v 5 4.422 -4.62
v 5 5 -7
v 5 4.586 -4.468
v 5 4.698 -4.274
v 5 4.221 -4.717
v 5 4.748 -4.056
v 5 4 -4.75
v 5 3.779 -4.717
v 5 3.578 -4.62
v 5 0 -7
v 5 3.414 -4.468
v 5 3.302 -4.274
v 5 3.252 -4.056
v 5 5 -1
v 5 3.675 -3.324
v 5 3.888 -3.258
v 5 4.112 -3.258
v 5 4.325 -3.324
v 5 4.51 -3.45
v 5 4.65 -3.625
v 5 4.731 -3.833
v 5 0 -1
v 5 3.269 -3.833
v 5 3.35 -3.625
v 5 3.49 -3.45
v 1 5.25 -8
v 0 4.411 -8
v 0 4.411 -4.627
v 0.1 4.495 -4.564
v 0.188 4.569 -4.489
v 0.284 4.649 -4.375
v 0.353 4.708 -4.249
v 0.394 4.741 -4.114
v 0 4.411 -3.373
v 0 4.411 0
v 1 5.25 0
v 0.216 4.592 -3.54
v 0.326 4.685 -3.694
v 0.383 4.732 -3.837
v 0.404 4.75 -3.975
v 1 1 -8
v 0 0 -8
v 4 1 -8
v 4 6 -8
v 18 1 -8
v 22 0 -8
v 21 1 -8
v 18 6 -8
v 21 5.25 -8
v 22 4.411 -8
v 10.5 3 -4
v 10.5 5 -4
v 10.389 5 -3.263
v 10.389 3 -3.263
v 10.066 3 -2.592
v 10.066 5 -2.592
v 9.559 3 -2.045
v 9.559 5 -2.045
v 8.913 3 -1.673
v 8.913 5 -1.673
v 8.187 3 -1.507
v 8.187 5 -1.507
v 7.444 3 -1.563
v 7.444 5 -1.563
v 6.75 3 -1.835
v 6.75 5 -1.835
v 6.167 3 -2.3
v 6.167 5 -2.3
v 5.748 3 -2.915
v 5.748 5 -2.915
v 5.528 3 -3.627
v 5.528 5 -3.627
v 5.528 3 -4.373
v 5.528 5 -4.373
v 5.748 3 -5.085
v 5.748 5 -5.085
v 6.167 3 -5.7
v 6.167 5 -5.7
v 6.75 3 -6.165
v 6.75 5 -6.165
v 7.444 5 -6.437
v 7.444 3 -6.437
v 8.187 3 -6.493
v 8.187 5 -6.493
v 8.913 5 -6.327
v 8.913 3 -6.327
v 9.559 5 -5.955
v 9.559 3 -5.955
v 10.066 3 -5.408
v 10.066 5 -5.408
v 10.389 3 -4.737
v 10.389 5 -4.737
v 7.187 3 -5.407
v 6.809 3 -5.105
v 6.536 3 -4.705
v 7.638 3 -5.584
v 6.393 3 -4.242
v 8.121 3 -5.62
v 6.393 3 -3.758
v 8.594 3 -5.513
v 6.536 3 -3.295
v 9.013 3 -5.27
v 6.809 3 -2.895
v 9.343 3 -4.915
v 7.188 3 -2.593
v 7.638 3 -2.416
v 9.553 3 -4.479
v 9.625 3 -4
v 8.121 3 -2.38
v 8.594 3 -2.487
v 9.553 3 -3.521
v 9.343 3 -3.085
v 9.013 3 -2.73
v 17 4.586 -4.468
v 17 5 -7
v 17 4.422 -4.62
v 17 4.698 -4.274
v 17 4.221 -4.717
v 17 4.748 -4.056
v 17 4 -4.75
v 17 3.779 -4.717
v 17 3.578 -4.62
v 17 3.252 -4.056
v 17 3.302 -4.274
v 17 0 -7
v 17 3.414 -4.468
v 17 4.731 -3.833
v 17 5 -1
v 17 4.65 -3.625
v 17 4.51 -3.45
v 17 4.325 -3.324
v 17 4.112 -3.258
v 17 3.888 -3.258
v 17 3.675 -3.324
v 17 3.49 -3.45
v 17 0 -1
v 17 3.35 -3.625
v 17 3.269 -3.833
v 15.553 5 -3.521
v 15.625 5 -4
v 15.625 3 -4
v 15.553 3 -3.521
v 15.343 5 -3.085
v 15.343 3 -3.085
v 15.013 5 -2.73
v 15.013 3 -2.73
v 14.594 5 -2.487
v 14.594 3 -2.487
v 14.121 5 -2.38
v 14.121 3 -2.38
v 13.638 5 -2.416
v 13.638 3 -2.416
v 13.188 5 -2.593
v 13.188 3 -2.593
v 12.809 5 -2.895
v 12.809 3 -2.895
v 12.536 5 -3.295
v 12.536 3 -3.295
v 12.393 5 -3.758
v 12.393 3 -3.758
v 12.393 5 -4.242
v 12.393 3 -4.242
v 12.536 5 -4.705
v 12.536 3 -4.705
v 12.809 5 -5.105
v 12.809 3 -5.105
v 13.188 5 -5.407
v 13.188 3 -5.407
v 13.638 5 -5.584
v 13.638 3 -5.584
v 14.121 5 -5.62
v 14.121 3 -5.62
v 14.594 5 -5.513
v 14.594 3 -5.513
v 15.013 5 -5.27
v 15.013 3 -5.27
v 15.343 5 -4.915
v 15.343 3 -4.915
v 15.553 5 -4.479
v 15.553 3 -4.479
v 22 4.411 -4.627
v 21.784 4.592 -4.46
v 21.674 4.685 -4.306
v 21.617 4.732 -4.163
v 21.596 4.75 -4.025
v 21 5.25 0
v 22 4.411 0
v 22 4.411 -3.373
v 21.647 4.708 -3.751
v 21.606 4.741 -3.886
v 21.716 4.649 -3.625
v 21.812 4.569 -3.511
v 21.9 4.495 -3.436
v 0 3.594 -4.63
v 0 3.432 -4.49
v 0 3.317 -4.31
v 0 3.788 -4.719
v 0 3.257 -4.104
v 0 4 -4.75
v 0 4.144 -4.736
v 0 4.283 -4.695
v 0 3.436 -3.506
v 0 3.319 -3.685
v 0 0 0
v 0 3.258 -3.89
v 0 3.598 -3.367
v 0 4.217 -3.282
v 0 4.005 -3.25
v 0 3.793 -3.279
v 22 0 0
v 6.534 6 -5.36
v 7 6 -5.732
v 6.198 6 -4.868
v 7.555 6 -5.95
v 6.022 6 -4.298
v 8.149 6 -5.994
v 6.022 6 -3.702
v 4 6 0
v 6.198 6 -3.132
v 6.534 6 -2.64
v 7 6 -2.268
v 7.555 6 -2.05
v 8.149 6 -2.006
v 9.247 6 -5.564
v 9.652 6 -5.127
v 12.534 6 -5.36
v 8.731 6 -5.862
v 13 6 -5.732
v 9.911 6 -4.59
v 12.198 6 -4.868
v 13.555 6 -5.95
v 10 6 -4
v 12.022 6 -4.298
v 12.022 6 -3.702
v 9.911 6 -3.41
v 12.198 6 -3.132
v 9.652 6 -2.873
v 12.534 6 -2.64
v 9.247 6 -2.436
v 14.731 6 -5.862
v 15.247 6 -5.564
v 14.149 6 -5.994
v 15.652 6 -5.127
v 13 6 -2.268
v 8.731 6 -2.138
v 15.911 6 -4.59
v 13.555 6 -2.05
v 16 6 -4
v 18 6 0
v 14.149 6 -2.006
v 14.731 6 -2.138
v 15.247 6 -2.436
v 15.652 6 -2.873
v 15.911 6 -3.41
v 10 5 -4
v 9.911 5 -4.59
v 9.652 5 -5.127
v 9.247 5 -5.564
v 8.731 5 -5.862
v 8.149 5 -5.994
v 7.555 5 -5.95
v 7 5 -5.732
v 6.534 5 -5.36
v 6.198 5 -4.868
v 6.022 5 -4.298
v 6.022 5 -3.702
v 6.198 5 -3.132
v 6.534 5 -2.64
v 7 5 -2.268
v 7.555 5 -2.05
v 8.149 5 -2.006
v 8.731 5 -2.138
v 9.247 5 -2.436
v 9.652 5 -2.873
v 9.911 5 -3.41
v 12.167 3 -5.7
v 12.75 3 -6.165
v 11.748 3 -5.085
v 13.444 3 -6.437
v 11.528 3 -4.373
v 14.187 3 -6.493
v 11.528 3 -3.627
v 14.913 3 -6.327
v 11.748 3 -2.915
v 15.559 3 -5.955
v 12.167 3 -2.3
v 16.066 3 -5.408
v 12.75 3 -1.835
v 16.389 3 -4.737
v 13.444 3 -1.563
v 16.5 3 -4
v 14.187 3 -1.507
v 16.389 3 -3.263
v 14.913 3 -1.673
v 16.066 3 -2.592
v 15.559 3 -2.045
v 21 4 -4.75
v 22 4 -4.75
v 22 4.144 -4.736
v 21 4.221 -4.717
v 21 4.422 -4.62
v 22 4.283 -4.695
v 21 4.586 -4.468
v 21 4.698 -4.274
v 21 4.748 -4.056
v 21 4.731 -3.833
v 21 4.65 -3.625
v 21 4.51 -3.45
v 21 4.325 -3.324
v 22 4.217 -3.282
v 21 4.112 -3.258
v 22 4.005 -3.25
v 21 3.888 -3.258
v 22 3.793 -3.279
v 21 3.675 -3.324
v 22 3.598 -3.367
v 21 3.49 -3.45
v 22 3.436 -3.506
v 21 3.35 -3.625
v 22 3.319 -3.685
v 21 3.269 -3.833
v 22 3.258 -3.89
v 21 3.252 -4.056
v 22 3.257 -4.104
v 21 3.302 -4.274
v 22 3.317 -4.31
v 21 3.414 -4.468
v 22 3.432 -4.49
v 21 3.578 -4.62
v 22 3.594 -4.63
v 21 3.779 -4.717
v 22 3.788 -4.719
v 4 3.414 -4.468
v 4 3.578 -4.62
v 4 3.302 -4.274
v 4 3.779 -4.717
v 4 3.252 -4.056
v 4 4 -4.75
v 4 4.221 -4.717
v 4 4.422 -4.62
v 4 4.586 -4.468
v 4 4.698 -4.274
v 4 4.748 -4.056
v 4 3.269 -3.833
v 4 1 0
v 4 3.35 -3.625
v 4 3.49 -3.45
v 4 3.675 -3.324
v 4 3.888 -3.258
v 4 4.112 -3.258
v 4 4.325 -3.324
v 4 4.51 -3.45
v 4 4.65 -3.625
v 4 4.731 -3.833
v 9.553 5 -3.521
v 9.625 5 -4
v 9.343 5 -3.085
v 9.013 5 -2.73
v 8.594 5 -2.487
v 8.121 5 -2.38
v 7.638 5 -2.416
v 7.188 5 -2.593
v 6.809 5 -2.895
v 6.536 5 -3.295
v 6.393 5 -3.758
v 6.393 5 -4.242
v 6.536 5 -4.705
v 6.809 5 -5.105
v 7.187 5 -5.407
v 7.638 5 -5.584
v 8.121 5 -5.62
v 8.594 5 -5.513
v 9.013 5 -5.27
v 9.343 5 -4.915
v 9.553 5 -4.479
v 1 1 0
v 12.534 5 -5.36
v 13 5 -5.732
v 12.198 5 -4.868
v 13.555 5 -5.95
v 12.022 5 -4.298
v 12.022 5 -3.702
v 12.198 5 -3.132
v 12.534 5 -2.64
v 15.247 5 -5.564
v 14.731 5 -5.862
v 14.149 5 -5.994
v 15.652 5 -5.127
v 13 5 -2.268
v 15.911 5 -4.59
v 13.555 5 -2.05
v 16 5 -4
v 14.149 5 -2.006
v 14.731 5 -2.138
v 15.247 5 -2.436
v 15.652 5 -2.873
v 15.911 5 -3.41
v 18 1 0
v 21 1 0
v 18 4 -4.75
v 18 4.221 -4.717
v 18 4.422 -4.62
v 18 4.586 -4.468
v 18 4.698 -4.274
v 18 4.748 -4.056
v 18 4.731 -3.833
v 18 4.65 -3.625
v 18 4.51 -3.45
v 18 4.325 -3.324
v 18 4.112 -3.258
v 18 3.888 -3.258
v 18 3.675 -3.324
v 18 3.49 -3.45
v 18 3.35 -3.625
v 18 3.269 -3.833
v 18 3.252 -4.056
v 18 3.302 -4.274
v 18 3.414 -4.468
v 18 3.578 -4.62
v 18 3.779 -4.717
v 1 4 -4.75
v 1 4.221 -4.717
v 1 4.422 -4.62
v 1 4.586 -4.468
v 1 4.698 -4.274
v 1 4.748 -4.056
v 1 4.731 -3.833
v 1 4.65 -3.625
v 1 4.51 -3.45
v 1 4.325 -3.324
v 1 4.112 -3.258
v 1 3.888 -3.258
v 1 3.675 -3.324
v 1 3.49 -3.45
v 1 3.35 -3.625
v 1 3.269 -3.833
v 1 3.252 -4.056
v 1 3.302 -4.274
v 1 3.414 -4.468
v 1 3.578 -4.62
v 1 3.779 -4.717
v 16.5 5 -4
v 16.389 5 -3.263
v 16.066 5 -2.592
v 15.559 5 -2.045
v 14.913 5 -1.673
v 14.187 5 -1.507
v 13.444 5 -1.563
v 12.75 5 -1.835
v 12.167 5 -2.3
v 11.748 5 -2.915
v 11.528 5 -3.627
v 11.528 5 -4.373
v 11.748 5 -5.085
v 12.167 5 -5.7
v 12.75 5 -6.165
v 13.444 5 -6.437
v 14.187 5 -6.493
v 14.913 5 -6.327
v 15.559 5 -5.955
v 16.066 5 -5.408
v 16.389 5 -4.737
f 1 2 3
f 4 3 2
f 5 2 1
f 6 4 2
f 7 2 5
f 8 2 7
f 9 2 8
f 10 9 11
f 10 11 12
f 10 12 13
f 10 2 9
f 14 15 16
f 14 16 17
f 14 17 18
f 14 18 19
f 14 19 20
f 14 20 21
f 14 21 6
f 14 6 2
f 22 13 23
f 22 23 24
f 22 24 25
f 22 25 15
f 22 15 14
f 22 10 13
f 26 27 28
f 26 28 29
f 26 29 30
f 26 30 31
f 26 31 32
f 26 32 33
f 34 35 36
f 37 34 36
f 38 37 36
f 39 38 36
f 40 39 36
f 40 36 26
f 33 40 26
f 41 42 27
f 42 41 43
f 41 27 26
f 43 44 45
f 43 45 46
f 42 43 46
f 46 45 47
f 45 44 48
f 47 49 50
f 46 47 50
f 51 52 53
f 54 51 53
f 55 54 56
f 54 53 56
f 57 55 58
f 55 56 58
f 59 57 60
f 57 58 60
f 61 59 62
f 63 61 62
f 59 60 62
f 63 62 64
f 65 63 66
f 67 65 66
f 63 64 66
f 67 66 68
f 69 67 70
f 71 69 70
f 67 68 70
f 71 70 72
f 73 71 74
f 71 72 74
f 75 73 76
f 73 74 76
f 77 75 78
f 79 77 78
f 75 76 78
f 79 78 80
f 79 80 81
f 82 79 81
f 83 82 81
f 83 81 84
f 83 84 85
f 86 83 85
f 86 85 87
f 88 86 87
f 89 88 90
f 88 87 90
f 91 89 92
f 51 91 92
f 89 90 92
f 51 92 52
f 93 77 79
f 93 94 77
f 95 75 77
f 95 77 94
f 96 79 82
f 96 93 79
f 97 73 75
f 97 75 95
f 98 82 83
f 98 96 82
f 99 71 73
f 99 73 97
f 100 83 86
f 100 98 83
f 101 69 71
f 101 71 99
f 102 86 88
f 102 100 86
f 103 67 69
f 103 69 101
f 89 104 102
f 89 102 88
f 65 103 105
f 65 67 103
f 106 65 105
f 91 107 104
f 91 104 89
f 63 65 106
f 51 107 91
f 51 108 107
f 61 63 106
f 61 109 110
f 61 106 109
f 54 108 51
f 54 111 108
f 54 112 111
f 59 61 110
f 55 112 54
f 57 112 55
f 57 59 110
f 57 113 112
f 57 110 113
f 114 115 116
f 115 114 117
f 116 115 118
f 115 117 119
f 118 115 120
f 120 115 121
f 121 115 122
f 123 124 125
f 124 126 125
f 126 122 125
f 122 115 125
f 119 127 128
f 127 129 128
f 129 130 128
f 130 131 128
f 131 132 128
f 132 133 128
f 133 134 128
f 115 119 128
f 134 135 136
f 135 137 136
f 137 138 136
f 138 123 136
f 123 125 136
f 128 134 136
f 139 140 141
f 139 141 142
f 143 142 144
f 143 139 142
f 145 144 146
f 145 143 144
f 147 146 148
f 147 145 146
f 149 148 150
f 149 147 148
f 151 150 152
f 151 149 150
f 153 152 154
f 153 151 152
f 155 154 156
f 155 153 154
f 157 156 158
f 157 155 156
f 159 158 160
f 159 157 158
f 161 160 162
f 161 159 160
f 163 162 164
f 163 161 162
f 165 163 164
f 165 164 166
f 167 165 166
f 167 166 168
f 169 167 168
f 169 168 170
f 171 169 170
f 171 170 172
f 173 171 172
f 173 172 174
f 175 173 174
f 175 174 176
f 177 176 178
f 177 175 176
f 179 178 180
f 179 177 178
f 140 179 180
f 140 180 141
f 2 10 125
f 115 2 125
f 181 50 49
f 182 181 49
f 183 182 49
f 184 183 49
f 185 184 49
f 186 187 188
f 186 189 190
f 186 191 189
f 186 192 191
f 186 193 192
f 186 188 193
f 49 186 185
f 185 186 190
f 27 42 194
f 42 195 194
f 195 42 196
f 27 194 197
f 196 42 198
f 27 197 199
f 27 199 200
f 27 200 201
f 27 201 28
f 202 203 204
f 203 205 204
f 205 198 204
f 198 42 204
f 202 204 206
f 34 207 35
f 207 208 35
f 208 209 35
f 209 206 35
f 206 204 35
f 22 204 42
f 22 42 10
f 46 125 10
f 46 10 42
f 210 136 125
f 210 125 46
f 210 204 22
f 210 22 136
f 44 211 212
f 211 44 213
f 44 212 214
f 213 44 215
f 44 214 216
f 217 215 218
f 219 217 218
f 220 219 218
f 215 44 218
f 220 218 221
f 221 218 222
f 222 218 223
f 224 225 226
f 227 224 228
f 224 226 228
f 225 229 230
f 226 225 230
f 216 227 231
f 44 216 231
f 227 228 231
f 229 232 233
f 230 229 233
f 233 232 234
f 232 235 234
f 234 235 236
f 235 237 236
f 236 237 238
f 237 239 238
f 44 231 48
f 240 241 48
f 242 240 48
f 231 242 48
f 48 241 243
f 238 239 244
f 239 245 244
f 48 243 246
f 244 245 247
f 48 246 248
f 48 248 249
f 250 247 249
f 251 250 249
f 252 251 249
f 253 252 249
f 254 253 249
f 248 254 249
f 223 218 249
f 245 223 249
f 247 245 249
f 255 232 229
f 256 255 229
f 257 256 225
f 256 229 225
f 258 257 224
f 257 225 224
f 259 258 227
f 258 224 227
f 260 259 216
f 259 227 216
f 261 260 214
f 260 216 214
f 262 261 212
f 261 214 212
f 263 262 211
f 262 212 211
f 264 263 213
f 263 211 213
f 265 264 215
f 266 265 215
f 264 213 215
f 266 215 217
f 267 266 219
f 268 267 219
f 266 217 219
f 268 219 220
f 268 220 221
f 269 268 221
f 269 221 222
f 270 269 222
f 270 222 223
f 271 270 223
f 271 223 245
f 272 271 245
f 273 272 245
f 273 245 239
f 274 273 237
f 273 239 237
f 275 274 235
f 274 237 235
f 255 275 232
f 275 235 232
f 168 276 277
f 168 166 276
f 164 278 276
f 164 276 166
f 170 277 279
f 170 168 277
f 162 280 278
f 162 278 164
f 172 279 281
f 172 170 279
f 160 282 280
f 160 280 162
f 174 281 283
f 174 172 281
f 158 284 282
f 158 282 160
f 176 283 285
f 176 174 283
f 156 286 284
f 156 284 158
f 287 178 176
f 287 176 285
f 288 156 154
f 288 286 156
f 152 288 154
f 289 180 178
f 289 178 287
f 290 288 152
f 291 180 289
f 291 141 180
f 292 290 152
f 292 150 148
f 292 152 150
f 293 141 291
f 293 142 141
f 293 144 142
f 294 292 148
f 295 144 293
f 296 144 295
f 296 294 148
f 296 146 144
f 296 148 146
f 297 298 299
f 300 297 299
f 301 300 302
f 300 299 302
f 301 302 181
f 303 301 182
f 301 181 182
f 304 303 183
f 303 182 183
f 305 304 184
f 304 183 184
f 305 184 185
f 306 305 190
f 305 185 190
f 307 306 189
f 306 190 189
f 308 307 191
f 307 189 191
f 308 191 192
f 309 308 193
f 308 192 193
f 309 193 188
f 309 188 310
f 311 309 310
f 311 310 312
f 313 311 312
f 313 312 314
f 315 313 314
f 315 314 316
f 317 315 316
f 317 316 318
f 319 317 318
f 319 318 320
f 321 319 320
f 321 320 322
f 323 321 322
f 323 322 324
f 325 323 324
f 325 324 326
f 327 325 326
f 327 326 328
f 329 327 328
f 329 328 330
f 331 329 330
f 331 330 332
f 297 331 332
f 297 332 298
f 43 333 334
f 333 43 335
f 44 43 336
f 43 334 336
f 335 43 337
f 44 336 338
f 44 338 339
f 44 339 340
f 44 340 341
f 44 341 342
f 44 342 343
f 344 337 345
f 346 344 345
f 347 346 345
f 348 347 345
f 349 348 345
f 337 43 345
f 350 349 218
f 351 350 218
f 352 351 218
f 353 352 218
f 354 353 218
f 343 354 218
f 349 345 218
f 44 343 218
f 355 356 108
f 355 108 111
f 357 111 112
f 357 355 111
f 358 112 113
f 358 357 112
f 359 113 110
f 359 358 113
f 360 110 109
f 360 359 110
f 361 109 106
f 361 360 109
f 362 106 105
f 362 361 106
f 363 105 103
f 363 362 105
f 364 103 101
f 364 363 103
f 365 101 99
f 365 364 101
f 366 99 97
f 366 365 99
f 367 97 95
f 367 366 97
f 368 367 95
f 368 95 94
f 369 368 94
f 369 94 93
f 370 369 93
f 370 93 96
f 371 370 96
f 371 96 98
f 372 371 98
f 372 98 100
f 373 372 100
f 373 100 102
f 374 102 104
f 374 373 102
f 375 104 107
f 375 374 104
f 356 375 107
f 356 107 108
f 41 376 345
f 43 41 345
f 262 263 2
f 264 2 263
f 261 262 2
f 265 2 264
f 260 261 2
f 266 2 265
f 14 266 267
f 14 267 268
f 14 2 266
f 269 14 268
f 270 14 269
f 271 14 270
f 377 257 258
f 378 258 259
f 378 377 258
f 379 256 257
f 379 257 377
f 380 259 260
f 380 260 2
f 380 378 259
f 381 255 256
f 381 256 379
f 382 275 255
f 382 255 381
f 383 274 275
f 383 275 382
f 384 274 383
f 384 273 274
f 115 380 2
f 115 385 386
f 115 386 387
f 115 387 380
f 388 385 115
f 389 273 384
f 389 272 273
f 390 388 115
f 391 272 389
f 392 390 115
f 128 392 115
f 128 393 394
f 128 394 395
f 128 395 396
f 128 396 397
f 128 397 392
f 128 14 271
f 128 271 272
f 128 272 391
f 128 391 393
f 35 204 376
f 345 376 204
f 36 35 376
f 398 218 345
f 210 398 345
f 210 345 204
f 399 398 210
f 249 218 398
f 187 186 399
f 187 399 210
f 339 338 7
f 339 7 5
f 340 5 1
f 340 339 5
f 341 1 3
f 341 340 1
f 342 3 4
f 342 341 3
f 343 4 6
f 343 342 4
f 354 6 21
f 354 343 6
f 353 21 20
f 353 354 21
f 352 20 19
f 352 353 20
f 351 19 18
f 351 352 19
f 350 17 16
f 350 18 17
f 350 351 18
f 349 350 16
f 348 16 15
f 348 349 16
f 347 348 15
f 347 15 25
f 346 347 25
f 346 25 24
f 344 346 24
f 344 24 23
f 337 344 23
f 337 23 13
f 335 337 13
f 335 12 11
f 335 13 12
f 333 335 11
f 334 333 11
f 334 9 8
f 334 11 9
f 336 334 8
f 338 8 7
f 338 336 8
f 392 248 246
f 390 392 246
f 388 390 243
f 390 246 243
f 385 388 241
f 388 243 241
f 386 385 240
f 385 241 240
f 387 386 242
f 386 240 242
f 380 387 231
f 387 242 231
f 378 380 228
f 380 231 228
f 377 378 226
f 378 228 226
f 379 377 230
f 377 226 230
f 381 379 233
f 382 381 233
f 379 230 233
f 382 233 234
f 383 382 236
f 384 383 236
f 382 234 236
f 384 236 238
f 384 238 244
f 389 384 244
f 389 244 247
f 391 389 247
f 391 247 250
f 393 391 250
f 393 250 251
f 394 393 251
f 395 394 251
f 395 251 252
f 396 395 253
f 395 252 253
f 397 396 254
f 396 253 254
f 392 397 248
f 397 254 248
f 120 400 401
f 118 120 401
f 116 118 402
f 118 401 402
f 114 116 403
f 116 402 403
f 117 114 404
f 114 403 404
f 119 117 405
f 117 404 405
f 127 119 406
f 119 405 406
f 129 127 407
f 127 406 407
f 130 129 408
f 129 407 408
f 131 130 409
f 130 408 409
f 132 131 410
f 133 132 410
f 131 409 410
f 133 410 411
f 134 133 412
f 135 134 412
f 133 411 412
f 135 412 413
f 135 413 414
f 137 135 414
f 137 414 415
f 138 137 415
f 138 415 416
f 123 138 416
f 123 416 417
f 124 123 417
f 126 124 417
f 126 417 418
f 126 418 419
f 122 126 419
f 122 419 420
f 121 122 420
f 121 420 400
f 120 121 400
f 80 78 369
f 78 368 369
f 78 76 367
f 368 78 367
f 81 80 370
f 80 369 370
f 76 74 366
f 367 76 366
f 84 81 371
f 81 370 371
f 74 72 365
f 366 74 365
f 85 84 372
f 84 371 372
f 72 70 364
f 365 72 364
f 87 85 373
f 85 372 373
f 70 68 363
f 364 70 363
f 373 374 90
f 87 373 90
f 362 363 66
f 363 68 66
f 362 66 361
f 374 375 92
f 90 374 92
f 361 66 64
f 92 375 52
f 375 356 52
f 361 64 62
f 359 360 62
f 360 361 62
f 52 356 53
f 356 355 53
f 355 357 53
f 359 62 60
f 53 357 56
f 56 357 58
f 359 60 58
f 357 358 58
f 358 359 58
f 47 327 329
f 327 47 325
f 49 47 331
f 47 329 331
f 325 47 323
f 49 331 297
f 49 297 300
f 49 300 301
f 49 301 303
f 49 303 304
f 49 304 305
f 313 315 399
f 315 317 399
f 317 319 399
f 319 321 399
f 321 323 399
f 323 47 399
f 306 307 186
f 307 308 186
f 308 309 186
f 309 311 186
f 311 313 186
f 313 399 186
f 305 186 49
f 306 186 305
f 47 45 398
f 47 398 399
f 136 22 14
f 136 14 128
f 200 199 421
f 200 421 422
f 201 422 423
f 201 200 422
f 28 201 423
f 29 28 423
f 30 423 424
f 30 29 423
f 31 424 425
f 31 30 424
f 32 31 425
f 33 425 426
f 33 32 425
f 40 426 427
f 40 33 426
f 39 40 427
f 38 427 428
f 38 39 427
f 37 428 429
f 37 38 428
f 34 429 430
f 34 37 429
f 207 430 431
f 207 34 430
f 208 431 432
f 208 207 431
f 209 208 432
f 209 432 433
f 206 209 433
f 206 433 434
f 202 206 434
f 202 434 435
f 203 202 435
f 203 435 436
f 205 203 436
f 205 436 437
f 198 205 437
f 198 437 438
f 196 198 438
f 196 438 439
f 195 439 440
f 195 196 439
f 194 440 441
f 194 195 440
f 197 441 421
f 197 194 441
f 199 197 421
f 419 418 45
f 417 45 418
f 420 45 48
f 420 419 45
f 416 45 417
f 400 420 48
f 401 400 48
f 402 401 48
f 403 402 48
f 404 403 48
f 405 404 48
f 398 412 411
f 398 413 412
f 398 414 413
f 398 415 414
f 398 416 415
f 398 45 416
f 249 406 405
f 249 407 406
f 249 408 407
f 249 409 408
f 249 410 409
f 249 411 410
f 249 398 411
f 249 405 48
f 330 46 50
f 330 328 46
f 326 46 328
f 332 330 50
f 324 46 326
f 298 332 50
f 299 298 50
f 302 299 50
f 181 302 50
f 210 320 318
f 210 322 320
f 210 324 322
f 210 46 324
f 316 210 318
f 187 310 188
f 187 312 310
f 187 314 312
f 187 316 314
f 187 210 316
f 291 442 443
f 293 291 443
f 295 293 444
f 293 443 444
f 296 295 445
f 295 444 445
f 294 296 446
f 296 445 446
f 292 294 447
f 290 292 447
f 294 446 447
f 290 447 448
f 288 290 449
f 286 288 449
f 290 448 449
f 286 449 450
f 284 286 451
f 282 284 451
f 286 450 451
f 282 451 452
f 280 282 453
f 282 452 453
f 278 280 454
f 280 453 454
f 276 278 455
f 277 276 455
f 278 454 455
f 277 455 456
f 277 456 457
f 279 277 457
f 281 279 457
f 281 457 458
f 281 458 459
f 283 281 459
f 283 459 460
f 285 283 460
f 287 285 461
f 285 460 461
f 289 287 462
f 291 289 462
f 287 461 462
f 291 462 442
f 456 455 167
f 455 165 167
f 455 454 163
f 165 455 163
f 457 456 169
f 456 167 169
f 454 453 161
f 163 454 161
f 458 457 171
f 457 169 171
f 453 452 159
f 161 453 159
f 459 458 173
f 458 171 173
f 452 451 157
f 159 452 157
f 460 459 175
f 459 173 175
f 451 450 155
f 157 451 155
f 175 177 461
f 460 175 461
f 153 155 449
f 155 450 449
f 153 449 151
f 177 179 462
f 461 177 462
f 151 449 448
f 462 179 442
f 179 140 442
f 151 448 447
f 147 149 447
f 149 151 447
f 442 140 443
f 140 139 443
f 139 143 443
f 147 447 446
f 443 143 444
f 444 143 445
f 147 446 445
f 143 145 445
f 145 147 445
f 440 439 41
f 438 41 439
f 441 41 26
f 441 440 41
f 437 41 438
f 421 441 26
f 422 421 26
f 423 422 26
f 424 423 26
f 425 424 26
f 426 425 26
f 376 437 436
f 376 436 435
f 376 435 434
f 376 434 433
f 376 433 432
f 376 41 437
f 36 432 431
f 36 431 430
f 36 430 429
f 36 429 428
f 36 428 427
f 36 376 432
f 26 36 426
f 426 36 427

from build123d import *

# Parameters (mm, degrees)
SKETCH1_W             = 22
SKETCH1_H             = 6
BOSS_EXTRUDE1_DEPTH   = 8
SKETCH2_W             = 12
SKETCH2_H             = 6
CUT_EXTRUDE1_DEPTH    = 5
SKETCH3_R             = 2.5
SKETCH3_R_2           = 1.625
BOSS_EXTRUDE4_DEPTH   = 2
BOSS_EXTRUDE4_2_DEPTH = 2
SKETCH5_R             = 2
CUT_EXTRUDE3_DEPTH    = 1
SKETCH6_W             = 3
SKETCH6_H             = 5
CUT_EXTRUDE4_DEPTH    = 9
SKETCH8_R             = 0.75
CUT_EXTRUDE6_DEPTH    = 5.5
CUT_EXTRUDE7_DEPTH    = 10


with BuildPart() as part:
    # Sketch1 → Boss-Extrude1 (new body)
    with BuildSketch(Plane.XY):
        with Locations((11, 3)):
            Rectangle(SKETCH1_W, SKETCH1_H)
    extrude(amount=-BOSS_EXTRUDE1_DEPTH)

    # Sketch2 → Cut-Extrude1 (cut)
    with BuildSketch(Plane.XZ):
        with Locations((11, -4)):
            Rectangle(SKETCH2_W, SKETCH2_H)
    extrude(amount=-CUT_EXTRUDE1_DEPTH, mode=Mode.SUBTRACT)

    # Sketch5 → Cut-Extrude3 (cut)
    with BuildSketch(Plane(origin=(0, 6, 0), x_dir=(1, 0, 0), z_dir=(0, 1, 0))):
        with Locations((8, 4)):
            Circle(SKETCH5_R)
        with Locations((14, 4)):
            Circle(SKETCH5_R)
    extrude(amount=-CUT_EXTRUDE3_DEPTH, mode=Mode.SUBTRACT)

    # Sketch6 → Cut-Extrude4 (cut, through all)
    with BuildSketch(Plane.XY):
        with Locations((2.5, 3.5)):
            Rectangle(SKETCH6_W, SKETCH6_H)
        with Locations((19.5, 3.5)):
            Rectangle(SKETCH6_W, SKETCH6_H)
    extrude(amount=-CUT_EXTRUDE4_DEPTH, mode=Mode.SUBTRACT)

    # Sketch8 → Cut-Extrude6 (cut)
    with BuildSketch(Plane(origin=(22, 0, 0), x_dir=(0, 0, -1), z_dir=(1, 0, 0))):
        with Locations((4, 4)):
            Circle(SKETCH8_R)
    cut_extrude6 = extrude(amount=-CUT_EXTRUDE6_DEPTH, mode=Mode.SUBTRACT)

    # Mirror1: Cut-Extrude6 across plane
    add(cut_extrude6.mirror(Plane(origin=(11, 0, 0), x_dir=(0, 0, 1), z_dir=(1, 0, 0))), mode=Mode.SUBTRACT)

    # Sketch9 → Cut-Extrude7 (cut)
    with BuildSketch(Plane.XY):
        Polygon((21, 6), (22, 6), (22, 4.410900369), (21, 5.25), align=None)
    cut_extrude7 = extrude(amount=-CUT_EXTRUDE7_DEPTH, mode=Mode.SUBTRACT)

    # Mirror2: Cut-Extrude7 across plane
    add(cut_extrude7.mirror(Plane(origin=(11, 0, 0), x_dir=(0, 0, 1), z_dir=(1, 0, 0))), mode=Mode.SUBTRACT)


with BuildPart() as body_2:
    # Sketch3 → Boss-Extrude4 (new body)
    with BuildSketch(Plane.XZ.offset(-5)):
        with Locations((8, -4)):
            Circle(SKETCH3_R)
        with Locations((8, -4)):
            Circle(SKETCH3_R_2, mode=Mode.SUBTRACT)
    extrude(amount=BOSS_EXTRUDE4_DEPTH)


with BuildPart() as body_3:
    # Sketch3 → Boss-Extrude4 2 (new body)
    with BuildSketch(Plane.XZ.offset(-5)):
        with Locations((14, -4)):
            Circle(SKETCH3_R)
        with Locations((14, -4)):
            Circle(SKETCH3_R_2, mode=Mode.SUBTRACT)
    extrude(amount=BOSS_EXTRUDE4_2_DEPTH)


solid = Compound([part.part, body_2.part, body_3.part])
